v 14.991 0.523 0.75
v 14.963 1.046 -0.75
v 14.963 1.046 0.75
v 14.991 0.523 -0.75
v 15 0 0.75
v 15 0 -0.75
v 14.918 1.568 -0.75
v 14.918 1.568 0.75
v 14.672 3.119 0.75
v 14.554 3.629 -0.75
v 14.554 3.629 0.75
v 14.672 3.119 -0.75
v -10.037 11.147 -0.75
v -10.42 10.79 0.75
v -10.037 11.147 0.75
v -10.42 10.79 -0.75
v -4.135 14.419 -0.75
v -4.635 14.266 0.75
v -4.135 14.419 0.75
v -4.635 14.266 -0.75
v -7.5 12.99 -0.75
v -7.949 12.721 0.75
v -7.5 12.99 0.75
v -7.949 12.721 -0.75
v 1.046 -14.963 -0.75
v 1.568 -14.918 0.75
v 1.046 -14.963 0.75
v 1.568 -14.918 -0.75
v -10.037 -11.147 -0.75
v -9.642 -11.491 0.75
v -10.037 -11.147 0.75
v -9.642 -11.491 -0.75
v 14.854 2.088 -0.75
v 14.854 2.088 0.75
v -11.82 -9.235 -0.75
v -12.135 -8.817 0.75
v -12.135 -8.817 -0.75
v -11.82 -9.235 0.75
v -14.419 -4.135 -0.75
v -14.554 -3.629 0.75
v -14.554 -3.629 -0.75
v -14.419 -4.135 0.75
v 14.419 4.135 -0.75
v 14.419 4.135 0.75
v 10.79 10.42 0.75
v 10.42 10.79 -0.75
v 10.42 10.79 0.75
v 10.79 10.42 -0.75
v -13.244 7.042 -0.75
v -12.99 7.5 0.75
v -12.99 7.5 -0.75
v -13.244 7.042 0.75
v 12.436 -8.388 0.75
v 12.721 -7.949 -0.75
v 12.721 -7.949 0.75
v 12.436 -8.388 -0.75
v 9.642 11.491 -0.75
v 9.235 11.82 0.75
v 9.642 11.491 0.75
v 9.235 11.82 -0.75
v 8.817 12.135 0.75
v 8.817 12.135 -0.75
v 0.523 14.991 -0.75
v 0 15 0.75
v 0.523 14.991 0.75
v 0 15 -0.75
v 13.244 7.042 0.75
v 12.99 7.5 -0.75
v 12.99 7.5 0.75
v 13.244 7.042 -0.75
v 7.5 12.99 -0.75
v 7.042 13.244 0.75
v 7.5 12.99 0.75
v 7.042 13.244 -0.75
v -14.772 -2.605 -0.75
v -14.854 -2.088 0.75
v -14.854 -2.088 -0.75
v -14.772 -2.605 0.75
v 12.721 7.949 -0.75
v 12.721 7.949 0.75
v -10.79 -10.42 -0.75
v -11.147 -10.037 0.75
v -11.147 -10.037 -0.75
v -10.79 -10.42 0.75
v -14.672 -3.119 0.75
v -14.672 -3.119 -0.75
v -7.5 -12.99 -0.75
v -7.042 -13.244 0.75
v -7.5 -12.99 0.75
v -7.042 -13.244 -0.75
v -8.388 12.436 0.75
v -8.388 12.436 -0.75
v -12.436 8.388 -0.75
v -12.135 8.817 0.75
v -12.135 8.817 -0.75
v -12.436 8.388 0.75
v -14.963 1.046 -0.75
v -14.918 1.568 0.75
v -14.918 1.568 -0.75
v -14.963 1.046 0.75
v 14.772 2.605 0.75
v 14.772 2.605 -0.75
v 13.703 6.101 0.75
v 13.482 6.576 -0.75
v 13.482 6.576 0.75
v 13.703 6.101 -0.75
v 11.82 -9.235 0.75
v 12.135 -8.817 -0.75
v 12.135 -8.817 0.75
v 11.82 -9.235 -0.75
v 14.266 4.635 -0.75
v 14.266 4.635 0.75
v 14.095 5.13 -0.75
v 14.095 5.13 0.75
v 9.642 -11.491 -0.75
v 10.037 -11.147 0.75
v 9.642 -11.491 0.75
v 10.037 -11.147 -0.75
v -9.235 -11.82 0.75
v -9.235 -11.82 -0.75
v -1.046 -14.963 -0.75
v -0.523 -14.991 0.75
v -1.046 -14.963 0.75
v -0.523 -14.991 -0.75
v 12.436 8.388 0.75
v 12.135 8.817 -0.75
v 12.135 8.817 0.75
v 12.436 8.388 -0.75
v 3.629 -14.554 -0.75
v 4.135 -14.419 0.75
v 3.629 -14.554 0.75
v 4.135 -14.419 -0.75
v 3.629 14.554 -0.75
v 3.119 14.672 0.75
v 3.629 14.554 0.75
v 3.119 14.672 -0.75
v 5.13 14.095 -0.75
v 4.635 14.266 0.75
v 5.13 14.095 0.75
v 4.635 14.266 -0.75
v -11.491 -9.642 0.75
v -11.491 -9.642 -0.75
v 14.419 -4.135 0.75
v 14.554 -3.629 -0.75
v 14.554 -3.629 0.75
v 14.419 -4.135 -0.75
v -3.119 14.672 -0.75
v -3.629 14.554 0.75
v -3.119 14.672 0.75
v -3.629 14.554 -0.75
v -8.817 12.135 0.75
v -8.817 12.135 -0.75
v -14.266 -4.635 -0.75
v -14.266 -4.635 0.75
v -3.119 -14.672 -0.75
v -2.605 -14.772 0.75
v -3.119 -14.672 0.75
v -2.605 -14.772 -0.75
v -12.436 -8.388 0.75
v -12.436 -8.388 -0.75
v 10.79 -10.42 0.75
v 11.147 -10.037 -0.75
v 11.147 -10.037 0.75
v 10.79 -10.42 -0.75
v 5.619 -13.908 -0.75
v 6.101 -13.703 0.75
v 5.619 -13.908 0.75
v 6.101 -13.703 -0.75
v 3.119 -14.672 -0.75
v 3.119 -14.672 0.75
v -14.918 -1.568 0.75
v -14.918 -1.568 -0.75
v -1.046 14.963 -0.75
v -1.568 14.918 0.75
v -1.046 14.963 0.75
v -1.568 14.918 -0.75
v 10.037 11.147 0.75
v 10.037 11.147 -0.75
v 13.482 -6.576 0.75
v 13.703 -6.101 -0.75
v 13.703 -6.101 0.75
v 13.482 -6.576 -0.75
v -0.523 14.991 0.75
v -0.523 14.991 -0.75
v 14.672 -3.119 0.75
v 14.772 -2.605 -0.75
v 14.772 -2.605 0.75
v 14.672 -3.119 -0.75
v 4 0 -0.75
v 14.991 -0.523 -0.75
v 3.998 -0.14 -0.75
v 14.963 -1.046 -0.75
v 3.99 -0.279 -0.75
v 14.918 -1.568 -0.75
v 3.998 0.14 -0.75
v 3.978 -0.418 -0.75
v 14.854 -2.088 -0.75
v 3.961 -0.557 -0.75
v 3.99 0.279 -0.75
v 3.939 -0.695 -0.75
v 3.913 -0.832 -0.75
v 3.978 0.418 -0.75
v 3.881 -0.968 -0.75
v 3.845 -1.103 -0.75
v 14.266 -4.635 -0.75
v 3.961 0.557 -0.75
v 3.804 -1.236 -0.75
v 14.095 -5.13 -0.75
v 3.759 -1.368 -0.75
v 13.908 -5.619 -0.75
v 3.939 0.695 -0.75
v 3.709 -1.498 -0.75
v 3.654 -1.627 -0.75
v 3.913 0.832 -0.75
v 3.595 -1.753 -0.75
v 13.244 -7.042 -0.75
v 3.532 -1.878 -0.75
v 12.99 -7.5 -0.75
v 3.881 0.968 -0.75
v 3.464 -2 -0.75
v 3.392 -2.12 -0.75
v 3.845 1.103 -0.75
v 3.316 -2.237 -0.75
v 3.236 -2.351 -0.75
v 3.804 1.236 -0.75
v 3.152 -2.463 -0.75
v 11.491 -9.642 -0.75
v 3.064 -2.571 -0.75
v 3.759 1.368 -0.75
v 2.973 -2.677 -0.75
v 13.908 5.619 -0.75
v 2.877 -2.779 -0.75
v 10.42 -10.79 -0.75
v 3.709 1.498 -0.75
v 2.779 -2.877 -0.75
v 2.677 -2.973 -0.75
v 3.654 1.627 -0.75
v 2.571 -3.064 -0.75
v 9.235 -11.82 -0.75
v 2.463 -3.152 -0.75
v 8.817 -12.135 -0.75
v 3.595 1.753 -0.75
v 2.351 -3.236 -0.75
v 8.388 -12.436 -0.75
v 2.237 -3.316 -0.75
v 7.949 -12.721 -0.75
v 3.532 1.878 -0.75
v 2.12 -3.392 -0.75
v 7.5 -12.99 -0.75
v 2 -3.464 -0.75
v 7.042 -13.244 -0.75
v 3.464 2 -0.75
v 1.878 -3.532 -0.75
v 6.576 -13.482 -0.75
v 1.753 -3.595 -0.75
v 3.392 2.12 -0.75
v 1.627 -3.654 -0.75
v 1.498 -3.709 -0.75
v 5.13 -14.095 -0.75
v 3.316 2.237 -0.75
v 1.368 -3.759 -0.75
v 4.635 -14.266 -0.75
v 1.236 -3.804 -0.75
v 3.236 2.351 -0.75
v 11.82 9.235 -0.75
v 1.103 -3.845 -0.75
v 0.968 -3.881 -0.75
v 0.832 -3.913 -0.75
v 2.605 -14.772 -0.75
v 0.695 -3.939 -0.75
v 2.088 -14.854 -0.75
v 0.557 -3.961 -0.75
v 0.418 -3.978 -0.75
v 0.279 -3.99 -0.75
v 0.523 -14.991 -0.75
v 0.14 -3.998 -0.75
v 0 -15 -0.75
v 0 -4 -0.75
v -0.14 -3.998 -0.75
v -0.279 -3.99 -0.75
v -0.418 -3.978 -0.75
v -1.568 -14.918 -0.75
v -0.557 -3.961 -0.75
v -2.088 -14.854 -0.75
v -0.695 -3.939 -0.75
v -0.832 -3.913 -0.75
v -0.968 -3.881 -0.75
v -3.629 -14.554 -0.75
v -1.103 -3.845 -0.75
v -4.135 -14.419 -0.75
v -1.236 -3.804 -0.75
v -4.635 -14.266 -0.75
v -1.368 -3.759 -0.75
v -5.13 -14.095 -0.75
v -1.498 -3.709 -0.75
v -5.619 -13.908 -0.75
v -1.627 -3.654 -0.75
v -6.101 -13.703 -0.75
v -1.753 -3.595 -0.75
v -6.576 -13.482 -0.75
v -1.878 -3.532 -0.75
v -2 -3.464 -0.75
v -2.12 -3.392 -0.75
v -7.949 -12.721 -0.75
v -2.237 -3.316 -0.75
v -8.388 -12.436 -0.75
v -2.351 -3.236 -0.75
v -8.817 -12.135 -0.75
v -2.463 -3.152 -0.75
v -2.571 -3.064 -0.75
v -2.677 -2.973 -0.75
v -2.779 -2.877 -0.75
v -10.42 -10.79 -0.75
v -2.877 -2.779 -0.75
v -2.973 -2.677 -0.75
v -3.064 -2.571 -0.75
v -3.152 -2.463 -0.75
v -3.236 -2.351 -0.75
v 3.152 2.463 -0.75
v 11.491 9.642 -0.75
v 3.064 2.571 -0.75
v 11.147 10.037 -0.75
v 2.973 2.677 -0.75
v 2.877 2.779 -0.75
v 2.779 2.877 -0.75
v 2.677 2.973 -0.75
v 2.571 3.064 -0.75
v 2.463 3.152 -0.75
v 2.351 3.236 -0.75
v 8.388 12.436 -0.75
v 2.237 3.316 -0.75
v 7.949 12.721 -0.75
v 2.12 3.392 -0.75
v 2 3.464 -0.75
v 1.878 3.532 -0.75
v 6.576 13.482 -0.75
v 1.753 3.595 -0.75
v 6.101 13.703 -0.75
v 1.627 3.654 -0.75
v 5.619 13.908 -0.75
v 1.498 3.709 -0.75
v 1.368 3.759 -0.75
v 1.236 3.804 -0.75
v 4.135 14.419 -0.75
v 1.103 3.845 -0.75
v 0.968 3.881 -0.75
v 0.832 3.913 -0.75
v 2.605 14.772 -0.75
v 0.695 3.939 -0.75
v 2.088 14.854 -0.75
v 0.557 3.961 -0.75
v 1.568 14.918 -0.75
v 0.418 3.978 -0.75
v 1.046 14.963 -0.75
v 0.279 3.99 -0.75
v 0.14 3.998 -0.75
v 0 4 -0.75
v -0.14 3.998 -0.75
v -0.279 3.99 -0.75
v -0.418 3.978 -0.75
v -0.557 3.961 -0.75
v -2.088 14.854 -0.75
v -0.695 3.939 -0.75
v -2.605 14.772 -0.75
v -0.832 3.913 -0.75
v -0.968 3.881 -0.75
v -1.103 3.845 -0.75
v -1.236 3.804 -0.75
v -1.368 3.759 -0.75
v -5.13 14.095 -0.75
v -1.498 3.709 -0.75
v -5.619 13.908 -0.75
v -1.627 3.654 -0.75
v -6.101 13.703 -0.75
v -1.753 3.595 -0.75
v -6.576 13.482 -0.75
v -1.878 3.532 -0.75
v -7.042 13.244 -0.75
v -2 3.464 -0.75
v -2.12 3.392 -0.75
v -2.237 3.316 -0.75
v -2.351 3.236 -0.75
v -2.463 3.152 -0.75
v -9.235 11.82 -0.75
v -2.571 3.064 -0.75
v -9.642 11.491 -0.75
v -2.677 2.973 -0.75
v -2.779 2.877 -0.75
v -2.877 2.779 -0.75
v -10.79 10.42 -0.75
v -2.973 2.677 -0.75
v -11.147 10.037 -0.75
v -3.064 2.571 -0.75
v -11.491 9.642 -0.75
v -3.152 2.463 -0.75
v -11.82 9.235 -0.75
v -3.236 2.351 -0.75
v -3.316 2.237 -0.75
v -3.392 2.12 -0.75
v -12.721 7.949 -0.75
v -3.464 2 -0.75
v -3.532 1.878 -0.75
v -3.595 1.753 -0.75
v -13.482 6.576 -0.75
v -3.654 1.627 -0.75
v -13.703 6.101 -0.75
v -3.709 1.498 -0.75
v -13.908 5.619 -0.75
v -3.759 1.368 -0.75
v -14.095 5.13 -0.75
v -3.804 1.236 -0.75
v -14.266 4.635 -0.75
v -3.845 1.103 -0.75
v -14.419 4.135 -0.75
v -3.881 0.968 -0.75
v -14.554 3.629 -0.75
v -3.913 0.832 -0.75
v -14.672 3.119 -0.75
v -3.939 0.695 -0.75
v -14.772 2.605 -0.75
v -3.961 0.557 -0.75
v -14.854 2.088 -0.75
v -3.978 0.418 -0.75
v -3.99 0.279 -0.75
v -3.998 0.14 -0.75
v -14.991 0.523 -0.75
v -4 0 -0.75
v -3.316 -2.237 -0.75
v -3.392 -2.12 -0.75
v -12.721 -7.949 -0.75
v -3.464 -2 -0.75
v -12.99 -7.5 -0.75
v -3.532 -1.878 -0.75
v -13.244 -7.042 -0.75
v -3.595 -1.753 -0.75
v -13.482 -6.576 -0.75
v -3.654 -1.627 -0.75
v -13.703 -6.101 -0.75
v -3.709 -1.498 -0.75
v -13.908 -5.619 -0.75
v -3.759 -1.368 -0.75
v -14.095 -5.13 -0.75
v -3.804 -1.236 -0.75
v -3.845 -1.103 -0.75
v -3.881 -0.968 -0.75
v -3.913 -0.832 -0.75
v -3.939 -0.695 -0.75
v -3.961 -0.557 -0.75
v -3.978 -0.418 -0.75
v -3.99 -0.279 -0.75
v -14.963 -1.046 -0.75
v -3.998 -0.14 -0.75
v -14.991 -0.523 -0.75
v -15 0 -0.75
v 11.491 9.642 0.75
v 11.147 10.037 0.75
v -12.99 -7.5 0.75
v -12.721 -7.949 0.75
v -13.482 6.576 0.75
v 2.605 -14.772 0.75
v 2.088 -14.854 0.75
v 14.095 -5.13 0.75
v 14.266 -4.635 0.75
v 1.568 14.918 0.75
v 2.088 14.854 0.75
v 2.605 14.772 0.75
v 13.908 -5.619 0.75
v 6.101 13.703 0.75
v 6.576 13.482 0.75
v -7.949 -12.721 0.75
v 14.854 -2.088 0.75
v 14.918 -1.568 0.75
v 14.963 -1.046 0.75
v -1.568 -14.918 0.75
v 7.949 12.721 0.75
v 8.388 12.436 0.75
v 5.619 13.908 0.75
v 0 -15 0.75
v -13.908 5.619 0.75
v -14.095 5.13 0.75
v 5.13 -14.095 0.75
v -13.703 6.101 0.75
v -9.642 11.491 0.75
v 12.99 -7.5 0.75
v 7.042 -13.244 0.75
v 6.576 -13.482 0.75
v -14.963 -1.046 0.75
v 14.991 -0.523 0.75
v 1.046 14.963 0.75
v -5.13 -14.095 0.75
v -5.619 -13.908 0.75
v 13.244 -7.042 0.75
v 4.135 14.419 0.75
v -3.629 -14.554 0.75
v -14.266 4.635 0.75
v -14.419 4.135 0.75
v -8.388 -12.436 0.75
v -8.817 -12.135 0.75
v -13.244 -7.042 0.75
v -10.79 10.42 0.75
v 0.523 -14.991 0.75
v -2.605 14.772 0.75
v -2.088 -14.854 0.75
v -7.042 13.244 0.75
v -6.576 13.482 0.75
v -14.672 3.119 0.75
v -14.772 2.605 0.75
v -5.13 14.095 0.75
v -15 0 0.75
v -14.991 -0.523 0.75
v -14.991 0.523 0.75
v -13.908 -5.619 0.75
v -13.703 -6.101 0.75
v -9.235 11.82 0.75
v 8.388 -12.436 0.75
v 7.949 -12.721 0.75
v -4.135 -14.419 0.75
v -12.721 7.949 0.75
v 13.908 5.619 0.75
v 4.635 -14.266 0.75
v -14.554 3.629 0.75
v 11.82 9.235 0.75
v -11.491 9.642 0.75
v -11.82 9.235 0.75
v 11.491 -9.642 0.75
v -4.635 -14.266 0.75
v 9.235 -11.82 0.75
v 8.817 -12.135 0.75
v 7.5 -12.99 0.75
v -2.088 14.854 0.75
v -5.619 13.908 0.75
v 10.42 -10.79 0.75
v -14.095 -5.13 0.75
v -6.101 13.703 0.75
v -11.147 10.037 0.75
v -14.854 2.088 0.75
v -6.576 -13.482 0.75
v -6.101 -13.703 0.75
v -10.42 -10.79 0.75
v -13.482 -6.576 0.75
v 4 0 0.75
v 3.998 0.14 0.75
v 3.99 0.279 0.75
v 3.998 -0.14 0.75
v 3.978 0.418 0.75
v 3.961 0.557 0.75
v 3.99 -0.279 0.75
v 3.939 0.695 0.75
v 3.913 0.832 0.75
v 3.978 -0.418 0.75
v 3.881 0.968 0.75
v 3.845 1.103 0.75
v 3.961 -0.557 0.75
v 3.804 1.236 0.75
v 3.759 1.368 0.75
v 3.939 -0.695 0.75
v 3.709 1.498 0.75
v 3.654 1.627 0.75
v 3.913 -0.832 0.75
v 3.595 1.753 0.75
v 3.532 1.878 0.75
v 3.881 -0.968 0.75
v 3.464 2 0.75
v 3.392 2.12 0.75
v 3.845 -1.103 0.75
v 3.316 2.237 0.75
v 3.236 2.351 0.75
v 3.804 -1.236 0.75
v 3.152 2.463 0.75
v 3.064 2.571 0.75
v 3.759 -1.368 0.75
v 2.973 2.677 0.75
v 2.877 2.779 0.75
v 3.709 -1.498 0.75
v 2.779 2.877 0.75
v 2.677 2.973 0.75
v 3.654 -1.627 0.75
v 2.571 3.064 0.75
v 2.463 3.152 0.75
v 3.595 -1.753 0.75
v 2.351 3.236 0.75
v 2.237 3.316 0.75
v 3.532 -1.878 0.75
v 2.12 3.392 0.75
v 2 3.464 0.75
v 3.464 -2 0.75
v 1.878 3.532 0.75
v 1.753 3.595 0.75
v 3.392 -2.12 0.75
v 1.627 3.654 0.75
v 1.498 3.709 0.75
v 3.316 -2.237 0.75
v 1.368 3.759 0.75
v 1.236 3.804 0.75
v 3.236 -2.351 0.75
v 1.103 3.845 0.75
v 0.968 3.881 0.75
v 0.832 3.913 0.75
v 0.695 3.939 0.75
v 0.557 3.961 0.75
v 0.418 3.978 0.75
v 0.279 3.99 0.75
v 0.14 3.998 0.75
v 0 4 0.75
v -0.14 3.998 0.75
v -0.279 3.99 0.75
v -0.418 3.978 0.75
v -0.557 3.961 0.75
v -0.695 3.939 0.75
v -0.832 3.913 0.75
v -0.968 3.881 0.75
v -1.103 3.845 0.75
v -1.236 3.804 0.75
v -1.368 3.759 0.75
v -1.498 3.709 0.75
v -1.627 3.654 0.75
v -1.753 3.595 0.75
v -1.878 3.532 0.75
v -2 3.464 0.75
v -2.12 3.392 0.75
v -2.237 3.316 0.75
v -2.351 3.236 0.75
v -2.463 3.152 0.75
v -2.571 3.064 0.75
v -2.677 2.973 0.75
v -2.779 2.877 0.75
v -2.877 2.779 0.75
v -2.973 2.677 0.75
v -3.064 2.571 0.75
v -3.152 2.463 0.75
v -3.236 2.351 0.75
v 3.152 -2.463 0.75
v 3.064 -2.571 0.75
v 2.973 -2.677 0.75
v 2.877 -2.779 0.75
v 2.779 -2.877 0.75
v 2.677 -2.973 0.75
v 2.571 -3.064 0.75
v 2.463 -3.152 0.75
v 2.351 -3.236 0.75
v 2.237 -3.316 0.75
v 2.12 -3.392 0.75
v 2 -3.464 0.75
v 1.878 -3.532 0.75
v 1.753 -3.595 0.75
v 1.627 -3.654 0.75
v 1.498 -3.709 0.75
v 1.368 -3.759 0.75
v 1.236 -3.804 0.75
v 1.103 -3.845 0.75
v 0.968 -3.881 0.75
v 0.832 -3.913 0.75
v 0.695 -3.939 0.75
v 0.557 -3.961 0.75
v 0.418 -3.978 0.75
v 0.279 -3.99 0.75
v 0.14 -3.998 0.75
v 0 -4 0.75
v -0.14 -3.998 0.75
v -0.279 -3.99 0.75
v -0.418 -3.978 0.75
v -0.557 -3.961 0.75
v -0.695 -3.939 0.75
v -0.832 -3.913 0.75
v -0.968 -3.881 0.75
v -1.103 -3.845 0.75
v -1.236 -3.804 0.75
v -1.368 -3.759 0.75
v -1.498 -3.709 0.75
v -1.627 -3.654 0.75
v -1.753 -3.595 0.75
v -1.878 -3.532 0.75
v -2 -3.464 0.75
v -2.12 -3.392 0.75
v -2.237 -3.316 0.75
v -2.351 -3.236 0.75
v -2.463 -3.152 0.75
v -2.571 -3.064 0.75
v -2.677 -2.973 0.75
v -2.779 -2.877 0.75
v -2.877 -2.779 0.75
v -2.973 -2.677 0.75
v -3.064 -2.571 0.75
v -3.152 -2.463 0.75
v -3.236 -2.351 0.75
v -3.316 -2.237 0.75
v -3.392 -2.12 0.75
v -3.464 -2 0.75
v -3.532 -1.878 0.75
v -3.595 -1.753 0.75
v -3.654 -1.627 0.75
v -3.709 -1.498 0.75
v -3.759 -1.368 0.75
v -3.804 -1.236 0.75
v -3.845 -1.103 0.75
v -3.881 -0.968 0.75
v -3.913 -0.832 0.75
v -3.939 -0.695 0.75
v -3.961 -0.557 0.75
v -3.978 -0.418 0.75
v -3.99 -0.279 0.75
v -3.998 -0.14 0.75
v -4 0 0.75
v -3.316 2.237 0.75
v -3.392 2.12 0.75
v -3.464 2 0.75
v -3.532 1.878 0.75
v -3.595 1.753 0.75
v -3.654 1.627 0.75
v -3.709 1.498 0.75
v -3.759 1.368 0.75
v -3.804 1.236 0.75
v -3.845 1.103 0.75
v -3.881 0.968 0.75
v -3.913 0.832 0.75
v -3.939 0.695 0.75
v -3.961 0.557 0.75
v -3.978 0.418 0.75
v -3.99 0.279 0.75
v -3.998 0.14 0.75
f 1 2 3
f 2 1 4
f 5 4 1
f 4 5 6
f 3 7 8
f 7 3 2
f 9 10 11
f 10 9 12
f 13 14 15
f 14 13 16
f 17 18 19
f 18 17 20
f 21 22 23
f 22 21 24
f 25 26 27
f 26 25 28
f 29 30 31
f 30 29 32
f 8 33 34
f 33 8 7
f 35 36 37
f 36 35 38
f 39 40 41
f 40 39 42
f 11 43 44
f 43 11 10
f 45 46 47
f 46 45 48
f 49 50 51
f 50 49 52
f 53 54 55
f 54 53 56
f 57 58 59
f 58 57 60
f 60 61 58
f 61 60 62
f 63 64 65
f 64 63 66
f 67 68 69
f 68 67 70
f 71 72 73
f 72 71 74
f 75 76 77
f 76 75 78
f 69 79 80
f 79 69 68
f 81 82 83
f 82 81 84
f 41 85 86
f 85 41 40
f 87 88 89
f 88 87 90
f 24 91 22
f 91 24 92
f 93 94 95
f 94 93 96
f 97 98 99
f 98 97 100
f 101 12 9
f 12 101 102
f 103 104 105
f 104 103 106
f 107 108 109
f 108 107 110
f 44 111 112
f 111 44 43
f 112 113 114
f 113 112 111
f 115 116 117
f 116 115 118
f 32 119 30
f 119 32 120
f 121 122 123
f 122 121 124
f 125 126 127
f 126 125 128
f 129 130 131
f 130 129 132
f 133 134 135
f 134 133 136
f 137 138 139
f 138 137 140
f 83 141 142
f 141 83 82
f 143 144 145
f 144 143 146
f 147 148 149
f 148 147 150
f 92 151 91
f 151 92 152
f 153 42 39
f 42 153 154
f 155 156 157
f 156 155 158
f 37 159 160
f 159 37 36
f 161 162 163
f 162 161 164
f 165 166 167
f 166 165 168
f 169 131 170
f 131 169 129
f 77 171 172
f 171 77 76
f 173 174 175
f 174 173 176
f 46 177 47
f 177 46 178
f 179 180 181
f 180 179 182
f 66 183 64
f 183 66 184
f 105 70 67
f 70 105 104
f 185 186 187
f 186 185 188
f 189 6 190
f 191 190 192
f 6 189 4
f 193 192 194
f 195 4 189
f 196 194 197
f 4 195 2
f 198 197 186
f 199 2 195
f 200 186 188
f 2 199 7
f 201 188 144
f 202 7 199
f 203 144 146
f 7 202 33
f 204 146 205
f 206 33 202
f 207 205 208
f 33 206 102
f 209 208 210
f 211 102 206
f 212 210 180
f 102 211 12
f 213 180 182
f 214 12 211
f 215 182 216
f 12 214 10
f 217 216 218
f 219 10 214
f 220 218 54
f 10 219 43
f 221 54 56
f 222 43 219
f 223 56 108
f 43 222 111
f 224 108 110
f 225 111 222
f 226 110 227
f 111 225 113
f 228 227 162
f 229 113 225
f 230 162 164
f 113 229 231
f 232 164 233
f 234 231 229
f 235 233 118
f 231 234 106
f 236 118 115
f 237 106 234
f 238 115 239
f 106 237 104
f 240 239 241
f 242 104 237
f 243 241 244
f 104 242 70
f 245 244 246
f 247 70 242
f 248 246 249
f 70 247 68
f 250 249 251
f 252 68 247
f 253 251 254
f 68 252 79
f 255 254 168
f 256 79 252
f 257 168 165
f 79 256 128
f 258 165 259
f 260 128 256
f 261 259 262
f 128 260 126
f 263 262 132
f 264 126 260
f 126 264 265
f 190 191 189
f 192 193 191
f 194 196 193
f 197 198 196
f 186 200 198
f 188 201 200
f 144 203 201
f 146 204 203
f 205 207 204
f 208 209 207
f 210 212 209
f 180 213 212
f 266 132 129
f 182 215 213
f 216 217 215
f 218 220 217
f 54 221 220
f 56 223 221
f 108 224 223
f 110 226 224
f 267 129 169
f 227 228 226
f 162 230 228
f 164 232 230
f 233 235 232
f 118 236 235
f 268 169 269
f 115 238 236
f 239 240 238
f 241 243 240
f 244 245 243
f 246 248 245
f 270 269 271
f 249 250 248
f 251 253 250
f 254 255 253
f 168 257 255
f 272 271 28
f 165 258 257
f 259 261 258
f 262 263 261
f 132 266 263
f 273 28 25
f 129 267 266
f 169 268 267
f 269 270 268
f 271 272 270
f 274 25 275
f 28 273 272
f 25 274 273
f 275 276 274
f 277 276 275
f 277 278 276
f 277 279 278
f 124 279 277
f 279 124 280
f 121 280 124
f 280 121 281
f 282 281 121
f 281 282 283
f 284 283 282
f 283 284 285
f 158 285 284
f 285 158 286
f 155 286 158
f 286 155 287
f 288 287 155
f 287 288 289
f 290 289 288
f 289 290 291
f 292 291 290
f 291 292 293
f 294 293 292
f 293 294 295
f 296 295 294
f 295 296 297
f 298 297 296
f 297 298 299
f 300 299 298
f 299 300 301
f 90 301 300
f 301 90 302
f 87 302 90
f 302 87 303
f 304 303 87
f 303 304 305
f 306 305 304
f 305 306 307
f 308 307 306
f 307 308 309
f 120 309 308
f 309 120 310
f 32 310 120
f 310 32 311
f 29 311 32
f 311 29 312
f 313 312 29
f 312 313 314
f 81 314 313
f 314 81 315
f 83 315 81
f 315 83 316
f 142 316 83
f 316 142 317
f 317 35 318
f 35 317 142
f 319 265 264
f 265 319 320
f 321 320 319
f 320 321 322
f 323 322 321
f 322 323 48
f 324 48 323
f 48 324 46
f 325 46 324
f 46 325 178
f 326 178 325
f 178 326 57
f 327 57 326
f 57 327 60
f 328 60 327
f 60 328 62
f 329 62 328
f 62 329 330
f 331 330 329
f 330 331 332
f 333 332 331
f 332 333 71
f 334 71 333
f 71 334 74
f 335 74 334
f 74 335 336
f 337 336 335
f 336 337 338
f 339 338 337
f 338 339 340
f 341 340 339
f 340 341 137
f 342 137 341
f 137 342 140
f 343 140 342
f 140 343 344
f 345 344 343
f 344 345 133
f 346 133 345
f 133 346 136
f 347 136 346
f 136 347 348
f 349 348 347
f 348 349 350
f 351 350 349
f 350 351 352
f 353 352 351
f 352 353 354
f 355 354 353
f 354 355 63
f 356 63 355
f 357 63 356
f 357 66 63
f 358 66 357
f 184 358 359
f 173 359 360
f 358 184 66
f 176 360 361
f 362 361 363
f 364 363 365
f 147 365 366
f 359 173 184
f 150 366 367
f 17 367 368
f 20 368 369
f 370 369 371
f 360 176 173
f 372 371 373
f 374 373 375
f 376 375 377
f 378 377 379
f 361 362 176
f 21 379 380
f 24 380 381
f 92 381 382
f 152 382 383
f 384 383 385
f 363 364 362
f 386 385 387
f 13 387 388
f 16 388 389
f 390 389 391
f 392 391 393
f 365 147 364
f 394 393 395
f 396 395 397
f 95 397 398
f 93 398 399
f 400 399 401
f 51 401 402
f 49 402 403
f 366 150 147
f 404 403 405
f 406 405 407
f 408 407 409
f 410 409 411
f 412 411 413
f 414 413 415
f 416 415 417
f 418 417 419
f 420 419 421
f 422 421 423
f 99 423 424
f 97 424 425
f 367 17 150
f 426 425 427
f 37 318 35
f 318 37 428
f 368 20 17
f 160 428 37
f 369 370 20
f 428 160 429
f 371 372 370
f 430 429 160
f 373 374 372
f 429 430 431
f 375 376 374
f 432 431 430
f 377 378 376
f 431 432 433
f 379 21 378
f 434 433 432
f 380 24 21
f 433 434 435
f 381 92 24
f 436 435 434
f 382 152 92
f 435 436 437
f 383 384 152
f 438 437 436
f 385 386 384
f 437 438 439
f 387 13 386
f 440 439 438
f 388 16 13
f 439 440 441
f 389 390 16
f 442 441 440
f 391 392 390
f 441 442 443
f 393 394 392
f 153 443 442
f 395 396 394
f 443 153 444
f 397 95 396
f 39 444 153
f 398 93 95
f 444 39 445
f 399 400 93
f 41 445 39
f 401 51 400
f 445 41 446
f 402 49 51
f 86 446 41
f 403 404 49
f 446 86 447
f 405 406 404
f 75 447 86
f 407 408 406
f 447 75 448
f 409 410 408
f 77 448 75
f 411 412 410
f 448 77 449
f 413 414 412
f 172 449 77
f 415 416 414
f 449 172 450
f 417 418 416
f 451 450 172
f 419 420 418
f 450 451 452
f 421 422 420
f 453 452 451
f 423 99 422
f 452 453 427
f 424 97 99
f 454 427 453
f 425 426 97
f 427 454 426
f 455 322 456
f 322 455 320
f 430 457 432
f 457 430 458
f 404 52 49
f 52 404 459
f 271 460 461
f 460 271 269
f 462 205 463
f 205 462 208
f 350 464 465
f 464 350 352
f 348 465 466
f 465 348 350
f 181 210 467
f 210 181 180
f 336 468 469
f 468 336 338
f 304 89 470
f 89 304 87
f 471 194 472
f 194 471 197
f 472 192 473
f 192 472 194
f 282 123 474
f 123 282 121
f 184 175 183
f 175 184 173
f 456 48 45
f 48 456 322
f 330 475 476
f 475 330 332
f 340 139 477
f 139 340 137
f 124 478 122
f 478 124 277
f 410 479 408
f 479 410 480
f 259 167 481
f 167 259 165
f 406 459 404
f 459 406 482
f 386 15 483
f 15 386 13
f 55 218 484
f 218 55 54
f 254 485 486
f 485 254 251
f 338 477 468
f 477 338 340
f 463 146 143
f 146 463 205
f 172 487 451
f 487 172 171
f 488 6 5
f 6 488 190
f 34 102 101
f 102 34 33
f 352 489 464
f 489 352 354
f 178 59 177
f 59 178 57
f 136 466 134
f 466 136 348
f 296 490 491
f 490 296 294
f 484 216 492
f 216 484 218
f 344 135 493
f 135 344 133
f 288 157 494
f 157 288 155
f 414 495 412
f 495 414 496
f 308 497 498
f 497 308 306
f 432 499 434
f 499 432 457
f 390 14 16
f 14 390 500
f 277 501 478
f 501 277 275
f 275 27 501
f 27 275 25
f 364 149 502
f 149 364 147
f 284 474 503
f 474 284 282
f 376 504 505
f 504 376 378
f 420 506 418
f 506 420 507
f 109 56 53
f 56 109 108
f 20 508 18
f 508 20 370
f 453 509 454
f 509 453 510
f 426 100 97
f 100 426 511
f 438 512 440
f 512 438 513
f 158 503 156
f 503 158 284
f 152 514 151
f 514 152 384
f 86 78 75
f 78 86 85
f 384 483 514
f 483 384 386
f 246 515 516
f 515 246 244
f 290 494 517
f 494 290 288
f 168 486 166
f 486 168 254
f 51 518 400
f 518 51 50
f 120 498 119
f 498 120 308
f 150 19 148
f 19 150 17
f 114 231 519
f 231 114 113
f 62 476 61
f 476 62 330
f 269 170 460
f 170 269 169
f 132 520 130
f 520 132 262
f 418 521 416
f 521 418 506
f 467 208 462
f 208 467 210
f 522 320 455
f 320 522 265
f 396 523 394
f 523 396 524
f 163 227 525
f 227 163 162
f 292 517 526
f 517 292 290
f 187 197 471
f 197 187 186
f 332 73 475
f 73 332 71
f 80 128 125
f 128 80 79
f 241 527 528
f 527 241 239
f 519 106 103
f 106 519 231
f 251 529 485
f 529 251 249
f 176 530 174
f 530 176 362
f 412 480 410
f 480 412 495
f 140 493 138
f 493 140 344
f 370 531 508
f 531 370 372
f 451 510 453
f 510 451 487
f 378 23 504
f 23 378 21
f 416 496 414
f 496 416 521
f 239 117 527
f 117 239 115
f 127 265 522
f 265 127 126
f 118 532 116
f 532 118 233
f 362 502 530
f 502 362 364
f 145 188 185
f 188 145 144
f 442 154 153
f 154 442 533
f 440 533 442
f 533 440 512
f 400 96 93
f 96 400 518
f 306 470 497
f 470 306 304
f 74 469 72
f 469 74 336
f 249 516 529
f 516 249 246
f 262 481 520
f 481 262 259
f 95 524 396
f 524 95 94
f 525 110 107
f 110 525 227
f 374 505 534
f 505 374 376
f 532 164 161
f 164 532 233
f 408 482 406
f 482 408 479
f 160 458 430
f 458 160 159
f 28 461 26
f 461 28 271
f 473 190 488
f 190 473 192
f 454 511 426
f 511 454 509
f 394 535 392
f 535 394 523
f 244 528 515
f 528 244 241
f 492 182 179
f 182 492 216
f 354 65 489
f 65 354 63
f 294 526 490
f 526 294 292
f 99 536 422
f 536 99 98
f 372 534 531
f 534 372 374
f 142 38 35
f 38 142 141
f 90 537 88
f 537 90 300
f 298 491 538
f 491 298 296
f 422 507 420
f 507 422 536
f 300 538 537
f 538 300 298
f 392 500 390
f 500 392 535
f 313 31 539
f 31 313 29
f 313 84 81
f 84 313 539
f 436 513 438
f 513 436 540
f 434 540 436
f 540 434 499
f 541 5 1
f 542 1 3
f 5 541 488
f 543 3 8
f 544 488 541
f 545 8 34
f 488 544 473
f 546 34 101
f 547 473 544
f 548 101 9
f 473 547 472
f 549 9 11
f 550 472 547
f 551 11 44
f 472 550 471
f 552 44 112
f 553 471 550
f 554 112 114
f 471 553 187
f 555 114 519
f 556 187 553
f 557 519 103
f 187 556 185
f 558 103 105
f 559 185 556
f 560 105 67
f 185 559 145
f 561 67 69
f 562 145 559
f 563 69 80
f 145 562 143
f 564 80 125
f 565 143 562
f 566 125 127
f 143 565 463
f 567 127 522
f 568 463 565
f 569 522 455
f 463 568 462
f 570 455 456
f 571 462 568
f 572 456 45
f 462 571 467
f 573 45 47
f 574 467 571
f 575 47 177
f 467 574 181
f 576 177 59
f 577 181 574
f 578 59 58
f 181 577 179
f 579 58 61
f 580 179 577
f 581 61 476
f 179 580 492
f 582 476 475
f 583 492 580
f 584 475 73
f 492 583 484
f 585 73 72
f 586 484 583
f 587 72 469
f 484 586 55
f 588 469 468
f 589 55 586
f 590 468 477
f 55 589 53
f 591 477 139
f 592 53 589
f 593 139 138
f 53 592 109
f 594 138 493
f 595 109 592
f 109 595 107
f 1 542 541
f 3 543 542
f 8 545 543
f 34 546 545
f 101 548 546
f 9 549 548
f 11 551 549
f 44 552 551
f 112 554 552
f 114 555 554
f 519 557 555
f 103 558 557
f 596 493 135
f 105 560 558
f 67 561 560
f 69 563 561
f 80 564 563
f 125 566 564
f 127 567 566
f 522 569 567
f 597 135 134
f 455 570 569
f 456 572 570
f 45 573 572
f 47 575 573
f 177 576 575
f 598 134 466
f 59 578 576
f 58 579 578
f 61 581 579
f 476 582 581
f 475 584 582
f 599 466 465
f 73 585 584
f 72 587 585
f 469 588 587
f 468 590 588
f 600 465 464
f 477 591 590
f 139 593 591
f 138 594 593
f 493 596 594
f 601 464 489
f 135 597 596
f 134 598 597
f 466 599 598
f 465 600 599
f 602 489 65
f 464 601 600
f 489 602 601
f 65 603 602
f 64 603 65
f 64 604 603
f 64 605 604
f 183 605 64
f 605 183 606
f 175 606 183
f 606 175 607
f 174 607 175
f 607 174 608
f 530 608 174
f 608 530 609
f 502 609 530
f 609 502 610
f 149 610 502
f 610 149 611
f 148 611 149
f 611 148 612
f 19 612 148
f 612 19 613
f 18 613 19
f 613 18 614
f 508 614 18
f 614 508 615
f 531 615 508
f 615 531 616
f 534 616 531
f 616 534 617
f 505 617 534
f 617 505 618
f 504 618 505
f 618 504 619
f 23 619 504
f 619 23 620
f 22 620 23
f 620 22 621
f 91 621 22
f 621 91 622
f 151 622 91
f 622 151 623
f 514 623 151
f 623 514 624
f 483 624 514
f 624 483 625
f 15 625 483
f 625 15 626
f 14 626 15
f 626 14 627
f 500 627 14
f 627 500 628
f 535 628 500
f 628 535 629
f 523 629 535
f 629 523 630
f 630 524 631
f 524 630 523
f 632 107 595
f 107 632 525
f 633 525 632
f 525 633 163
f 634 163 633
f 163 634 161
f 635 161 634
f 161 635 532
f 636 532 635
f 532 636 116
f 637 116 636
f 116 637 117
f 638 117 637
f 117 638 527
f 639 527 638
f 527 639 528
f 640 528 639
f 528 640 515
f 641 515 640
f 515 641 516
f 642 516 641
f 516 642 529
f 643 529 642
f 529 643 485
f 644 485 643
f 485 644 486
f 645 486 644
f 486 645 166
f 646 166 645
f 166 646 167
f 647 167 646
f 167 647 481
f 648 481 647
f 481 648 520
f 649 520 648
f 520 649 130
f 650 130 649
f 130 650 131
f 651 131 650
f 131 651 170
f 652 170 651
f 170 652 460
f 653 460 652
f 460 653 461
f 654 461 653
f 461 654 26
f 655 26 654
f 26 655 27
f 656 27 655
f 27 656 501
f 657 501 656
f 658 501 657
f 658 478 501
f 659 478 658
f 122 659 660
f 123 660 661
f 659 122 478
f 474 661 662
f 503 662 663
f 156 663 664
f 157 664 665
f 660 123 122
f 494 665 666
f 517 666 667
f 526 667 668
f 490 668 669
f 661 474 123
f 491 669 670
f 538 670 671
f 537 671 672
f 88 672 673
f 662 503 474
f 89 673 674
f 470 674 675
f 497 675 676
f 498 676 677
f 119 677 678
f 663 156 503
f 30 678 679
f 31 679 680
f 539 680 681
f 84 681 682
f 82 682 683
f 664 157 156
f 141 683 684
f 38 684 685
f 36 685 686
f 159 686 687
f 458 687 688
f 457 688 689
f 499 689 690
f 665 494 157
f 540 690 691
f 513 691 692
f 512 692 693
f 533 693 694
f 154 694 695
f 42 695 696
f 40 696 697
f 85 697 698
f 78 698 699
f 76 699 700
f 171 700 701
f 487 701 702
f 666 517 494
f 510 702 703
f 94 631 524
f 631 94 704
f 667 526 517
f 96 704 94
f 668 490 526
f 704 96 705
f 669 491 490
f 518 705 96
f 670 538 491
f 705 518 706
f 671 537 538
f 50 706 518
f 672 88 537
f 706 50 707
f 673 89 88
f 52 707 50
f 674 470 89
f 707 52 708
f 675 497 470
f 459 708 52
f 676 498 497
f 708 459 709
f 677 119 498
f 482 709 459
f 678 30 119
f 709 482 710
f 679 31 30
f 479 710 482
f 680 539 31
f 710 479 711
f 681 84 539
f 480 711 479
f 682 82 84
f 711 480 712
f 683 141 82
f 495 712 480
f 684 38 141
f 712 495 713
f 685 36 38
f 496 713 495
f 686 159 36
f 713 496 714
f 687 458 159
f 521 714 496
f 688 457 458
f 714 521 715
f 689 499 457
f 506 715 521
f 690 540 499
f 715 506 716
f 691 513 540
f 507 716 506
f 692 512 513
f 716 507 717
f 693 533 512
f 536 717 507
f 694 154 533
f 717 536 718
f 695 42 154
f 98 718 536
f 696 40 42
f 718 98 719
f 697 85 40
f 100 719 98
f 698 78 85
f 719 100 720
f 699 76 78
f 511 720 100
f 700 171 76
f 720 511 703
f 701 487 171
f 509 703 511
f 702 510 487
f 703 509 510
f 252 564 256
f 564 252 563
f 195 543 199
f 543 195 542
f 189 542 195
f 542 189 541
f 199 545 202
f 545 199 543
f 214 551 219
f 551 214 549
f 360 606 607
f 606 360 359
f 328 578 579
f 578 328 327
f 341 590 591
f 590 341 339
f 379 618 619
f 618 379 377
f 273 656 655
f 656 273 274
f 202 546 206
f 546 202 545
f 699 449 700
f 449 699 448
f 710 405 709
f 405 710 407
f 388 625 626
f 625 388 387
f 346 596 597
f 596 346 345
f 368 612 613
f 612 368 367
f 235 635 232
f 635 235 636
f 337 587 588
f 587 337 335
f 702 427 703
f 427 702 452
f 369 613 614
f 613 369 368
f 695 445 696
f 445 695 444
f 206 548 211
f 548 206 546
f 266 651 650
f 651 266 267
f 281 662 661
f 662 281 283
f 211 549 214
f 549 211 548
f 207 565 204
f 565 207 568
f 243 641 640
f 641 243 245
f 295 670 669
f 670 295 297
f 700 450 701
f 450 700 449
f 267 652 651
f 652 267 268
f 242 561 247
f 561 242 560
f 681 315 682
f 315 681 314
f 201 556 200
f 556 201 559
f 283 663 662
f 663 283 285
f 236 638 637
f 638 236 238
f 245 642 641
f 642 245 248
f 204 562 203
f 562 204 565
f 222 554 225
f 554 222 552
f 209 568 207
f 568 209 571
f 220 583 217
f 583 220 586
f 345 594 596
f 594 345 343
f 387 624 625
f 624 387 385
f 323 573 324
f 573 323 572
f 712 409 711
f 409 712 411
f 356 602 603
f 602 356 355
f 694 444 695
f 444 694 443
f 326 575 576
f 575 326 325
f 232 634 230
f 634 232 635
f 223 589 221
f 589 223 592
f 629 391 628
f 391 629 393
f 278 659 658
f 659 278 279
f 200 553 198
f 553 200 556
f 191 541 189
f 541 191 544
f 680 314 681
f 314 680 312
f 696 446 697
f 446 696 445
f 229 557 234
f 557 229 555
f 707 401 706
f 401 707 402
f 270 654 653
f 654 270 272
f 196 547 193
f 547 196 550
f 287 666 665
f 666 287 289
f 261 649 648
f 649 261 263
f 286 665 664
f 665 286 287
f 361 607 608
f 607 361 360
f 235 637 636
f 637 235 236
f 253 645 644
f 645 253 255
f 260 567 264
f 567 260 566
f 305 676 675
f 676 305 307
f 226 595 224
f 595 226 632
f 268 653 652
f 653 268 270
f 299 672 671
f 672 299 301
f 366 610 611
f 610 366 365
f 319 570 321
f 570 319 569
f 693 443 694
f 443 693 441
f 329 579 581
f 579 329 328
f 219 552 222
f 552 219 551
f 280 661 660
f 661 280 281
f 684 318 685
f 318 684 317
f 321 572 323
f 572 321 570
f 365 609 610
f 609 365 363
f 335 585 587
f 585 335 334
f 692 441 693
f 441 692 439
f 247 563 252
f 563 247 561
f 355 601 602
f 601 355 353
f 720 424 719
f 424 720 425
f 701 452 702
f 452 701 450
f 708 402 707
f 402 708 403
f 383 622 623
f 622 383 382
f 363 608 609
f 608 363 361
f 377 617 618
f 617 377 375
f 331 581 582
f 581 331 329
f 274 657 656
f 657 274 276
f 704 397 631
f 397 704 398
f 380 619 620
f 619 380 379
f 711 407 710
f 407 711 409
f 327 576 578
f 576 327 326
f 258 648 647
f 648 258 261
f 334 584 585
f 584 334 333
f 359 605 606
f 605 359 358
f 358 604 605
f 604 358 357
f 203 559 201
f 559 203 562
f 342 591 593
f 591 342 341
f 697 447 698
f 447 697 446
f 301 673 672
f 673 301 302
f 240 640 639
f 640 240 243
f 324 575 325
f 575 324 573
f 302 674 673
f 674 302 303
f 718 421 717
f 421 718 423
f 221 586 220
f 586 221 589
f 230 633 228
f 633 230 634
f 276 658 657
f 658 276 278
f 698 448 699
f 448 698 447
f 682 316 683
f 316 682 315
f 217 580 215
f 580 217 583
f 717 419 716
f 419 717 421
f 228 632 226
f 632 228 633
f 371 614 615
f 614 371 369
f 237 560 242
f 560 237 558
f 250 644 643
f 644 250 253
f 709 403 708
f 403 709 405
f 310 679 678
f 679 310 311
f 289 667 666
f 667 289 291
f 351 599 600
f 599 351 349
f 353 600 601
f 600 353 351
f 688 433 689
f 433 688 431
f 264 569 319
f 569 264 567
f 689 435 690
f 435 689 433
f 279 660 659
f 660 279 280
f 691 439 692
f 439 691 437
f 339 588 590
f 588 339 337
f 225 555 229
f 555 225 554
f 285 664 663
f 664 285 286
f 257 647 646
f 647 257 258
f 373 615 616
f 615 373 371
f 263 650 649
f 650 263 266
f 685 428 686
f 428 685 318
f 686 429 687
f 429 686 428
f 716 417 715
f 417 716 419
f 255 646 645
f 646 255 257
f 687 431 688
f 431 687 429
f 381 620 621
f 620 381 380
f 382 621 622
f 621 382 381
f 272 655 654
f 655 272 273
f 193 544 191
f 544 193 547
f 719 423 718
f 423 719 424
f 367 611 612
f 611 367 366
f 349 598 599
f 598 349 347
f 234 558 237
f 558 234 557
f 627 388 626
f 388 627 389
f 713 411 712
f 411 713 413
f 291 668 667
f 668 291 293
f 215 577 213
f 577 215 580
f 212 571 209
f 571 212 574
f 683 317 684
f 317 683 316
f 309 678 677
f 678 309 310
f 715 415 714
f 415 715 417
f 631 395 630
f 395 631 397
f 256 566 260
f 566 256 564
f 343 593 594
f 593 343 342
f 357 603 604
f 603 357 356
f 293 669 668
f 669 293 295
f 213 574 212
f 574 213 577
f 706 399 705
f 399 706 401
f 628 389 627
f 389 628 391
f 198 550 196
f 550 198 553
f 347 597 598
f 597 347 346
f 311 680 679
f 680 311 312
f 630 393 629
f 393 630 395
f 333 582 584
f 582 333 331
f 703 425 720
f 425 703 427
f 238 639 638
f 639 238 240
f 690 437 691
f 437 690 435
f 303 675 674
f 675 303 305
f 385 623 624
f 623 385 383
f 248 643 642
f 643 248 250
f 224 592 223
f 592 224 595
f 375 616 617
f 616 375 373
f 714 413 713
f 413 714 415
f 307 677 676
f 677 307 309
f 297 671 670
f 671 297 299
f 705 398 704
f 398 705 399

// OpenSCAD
// Penny washer parameters (mm)
inner_diameter = 8.0;   // ID
outer_diameter = 30.0;  // OD
thickness      = 1.5;   // thickness
eps            = 0.2;   // boolean clearance

$fn = 180;

// Single penny washer (one connected solid)
difference() {
    cylinder(d = outer_diameter, h = thickness, center = true);
    cylinder(d = inner_diameter, h = thickness + 2*eps, center = true);
}
